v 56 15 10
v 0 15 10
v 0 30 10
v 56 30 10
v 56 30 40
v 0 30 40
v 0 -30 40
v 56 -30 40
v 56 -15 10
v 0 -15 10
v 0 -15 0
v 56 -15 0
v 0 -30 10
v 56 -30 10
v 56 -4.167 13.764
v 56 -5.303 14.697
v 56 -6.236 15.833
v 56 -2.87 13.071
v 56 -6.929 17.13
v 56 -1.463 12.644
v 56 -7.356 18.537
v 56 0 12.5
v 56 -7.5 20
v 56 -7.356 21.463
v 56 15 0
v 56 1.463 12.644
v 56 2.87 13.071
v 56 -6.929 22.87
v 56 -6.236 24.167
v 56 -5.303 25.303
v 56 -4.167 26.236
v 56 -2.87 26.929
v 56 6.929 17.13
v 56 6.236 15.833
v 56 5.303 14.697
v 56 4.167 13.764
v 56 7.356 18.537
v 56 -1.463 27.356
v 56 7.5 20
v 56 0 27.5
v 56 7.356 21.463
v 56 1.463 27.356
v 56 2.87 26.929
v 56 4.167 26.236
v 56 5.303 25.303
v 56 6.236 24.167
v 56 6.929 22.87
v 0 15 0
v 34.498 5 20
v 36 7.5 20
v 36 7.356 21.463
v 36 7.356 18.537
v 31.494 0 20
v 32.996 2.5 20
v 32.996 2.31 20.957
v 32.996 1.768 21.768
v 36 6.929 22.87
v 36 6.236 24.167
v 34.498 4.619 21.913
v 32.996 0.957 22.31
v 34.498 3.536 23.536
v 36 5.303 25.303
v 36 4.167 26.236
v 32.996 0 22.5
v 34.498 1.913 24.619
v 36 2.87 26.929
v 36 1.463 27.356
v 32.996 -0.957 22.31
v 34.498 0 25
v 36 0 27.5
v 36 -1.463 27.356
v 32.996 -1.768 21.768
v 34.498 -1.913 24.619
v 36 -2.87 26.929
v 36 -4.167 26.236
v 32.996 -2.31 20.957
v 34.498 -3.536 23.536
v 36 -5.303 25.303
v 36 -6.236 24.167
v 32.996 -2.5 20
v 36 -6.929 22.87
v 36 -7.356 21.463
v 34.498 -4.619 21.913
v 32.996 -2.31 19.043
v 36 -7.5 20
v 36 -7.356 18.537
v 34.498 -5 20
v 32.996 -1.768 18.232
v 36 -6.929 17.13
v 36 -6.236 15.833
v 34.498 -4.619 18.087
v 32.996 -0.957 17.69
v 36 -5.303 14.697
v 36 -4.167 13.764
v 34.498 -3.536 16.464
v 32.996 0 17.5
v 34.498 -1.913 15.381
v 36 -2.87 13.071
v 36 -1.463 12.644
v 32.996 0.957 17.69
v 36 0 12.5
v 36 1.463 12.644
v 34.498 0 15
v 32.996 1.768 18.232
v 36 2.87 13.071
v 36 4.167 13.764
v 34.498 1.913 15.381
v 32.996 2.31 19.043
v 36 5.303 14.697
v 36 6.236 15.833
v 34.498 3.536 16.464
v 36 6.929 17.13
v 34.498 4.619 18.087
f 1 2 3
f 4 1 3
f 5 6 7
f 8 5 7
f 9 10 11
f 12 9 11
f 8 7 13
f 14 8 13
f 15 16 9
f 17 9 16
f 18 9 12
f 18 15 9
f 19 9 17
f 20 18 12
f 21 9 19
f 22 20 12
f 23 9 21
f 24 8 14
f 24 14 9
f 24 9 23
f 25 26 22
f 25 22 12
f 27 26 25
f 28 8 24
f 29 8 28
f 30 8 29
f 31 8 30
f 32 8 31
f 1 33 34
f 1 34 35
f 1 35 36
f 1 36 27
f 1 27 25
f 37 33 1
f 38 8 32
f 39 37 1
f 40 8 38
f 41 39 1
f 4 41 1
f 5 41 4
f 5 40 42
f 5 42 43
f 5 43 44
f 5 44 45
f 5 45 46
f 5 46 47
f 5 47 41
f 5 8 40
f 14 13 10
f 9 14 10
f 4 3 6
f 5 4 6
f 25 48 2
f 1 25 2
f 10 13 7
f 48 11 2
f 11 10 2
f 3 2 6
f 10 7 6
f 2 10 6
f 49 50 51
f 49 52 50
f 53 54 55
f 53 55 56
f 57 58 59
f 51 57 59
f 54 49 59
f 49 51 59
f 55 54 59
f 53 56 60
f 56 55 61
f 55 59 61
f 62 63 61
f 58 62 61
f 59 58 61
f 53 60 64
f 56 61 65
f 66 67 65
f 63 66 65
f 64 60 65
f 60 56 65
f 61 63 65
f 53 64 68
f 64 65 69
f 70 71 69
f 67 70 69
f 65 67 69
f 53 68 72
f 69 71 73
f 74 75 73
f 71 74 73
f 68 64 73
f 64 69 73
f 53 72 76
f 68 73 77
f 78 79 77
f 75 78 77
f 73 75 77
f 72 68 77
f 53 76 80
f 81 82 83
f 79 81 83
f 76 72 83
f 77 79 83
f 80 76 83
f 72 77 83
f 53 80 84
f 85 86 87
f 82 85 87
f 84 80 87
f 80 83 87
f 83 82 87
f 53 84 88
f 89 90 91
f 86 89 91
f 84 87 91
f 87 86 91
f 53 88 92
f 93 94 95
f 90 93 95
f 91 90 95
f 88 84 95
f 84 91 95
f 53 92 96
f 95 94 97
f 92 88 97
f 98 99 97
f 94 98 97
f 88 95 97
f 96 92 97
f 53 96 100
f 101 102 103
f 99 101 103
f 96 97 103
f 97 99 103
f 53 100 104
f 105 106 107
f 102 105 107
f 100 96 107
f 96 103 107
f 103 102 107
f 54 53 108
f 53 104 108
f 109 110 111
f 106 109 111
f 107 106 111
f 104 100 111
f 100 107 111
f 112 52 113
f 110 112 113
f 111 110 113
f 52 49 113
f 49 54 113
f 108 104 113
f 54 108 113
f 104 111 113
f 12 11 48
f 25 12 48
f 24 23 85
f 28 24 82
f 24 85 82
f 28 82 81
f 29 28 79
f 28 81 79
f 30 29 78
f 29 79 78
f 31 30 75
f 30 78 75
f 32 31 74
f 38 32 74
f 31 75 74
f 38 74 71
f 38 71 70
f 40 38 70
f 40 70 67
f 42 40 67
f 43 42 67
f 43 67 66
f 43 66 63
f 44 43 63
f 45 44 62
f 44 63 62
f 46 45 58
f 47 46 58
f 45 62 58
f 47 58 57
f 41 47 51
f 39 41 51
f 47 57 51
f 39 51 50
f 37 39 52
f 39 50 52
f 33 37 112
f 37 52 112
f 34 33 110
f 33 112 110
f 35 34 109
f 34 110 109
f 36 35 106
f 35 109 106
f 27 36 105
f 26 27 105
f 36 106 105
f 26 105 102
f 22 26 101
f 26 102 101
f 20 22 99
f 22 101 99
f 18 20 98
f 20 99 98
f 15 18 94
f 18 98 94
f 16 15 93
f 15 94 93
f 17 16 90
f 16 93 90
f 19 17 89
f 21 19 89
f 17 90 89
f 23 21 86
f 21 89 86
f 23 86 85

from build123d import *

# Parameters (mm, degrees)
F1_DEPTH = 56
F3_D     = 15
F3_DEPTH = 20
F3_TIP   = 4.5064546427


with BuildPart() as f1:
    # F0 (on Right) → F1 (new body)
    with BuildSketch(Plane.YZ):
        Polygon((-15, 0), (0, 0), (15, 0), (15, 10), (30, 10), (30, 40), (0, 40), (-30, 40), (-30, 10), (-15, 10), align=None)
    extrude(amount=F1_DEPTH)

    # F3
    with Locations(Plane.YZ.offset(56)):
        with Locations((0, 20)):
            Hole(F3_D / 2, depth=F3_DEPTH)
            with Locations((0, 0, -(F3_DEPTH + F3_TIP / 2))):  # 118° drill point
                Cone(0, F3_D / 2, F3_TIP, mode=Mode.SUBTRACT)


solid = f1.part
